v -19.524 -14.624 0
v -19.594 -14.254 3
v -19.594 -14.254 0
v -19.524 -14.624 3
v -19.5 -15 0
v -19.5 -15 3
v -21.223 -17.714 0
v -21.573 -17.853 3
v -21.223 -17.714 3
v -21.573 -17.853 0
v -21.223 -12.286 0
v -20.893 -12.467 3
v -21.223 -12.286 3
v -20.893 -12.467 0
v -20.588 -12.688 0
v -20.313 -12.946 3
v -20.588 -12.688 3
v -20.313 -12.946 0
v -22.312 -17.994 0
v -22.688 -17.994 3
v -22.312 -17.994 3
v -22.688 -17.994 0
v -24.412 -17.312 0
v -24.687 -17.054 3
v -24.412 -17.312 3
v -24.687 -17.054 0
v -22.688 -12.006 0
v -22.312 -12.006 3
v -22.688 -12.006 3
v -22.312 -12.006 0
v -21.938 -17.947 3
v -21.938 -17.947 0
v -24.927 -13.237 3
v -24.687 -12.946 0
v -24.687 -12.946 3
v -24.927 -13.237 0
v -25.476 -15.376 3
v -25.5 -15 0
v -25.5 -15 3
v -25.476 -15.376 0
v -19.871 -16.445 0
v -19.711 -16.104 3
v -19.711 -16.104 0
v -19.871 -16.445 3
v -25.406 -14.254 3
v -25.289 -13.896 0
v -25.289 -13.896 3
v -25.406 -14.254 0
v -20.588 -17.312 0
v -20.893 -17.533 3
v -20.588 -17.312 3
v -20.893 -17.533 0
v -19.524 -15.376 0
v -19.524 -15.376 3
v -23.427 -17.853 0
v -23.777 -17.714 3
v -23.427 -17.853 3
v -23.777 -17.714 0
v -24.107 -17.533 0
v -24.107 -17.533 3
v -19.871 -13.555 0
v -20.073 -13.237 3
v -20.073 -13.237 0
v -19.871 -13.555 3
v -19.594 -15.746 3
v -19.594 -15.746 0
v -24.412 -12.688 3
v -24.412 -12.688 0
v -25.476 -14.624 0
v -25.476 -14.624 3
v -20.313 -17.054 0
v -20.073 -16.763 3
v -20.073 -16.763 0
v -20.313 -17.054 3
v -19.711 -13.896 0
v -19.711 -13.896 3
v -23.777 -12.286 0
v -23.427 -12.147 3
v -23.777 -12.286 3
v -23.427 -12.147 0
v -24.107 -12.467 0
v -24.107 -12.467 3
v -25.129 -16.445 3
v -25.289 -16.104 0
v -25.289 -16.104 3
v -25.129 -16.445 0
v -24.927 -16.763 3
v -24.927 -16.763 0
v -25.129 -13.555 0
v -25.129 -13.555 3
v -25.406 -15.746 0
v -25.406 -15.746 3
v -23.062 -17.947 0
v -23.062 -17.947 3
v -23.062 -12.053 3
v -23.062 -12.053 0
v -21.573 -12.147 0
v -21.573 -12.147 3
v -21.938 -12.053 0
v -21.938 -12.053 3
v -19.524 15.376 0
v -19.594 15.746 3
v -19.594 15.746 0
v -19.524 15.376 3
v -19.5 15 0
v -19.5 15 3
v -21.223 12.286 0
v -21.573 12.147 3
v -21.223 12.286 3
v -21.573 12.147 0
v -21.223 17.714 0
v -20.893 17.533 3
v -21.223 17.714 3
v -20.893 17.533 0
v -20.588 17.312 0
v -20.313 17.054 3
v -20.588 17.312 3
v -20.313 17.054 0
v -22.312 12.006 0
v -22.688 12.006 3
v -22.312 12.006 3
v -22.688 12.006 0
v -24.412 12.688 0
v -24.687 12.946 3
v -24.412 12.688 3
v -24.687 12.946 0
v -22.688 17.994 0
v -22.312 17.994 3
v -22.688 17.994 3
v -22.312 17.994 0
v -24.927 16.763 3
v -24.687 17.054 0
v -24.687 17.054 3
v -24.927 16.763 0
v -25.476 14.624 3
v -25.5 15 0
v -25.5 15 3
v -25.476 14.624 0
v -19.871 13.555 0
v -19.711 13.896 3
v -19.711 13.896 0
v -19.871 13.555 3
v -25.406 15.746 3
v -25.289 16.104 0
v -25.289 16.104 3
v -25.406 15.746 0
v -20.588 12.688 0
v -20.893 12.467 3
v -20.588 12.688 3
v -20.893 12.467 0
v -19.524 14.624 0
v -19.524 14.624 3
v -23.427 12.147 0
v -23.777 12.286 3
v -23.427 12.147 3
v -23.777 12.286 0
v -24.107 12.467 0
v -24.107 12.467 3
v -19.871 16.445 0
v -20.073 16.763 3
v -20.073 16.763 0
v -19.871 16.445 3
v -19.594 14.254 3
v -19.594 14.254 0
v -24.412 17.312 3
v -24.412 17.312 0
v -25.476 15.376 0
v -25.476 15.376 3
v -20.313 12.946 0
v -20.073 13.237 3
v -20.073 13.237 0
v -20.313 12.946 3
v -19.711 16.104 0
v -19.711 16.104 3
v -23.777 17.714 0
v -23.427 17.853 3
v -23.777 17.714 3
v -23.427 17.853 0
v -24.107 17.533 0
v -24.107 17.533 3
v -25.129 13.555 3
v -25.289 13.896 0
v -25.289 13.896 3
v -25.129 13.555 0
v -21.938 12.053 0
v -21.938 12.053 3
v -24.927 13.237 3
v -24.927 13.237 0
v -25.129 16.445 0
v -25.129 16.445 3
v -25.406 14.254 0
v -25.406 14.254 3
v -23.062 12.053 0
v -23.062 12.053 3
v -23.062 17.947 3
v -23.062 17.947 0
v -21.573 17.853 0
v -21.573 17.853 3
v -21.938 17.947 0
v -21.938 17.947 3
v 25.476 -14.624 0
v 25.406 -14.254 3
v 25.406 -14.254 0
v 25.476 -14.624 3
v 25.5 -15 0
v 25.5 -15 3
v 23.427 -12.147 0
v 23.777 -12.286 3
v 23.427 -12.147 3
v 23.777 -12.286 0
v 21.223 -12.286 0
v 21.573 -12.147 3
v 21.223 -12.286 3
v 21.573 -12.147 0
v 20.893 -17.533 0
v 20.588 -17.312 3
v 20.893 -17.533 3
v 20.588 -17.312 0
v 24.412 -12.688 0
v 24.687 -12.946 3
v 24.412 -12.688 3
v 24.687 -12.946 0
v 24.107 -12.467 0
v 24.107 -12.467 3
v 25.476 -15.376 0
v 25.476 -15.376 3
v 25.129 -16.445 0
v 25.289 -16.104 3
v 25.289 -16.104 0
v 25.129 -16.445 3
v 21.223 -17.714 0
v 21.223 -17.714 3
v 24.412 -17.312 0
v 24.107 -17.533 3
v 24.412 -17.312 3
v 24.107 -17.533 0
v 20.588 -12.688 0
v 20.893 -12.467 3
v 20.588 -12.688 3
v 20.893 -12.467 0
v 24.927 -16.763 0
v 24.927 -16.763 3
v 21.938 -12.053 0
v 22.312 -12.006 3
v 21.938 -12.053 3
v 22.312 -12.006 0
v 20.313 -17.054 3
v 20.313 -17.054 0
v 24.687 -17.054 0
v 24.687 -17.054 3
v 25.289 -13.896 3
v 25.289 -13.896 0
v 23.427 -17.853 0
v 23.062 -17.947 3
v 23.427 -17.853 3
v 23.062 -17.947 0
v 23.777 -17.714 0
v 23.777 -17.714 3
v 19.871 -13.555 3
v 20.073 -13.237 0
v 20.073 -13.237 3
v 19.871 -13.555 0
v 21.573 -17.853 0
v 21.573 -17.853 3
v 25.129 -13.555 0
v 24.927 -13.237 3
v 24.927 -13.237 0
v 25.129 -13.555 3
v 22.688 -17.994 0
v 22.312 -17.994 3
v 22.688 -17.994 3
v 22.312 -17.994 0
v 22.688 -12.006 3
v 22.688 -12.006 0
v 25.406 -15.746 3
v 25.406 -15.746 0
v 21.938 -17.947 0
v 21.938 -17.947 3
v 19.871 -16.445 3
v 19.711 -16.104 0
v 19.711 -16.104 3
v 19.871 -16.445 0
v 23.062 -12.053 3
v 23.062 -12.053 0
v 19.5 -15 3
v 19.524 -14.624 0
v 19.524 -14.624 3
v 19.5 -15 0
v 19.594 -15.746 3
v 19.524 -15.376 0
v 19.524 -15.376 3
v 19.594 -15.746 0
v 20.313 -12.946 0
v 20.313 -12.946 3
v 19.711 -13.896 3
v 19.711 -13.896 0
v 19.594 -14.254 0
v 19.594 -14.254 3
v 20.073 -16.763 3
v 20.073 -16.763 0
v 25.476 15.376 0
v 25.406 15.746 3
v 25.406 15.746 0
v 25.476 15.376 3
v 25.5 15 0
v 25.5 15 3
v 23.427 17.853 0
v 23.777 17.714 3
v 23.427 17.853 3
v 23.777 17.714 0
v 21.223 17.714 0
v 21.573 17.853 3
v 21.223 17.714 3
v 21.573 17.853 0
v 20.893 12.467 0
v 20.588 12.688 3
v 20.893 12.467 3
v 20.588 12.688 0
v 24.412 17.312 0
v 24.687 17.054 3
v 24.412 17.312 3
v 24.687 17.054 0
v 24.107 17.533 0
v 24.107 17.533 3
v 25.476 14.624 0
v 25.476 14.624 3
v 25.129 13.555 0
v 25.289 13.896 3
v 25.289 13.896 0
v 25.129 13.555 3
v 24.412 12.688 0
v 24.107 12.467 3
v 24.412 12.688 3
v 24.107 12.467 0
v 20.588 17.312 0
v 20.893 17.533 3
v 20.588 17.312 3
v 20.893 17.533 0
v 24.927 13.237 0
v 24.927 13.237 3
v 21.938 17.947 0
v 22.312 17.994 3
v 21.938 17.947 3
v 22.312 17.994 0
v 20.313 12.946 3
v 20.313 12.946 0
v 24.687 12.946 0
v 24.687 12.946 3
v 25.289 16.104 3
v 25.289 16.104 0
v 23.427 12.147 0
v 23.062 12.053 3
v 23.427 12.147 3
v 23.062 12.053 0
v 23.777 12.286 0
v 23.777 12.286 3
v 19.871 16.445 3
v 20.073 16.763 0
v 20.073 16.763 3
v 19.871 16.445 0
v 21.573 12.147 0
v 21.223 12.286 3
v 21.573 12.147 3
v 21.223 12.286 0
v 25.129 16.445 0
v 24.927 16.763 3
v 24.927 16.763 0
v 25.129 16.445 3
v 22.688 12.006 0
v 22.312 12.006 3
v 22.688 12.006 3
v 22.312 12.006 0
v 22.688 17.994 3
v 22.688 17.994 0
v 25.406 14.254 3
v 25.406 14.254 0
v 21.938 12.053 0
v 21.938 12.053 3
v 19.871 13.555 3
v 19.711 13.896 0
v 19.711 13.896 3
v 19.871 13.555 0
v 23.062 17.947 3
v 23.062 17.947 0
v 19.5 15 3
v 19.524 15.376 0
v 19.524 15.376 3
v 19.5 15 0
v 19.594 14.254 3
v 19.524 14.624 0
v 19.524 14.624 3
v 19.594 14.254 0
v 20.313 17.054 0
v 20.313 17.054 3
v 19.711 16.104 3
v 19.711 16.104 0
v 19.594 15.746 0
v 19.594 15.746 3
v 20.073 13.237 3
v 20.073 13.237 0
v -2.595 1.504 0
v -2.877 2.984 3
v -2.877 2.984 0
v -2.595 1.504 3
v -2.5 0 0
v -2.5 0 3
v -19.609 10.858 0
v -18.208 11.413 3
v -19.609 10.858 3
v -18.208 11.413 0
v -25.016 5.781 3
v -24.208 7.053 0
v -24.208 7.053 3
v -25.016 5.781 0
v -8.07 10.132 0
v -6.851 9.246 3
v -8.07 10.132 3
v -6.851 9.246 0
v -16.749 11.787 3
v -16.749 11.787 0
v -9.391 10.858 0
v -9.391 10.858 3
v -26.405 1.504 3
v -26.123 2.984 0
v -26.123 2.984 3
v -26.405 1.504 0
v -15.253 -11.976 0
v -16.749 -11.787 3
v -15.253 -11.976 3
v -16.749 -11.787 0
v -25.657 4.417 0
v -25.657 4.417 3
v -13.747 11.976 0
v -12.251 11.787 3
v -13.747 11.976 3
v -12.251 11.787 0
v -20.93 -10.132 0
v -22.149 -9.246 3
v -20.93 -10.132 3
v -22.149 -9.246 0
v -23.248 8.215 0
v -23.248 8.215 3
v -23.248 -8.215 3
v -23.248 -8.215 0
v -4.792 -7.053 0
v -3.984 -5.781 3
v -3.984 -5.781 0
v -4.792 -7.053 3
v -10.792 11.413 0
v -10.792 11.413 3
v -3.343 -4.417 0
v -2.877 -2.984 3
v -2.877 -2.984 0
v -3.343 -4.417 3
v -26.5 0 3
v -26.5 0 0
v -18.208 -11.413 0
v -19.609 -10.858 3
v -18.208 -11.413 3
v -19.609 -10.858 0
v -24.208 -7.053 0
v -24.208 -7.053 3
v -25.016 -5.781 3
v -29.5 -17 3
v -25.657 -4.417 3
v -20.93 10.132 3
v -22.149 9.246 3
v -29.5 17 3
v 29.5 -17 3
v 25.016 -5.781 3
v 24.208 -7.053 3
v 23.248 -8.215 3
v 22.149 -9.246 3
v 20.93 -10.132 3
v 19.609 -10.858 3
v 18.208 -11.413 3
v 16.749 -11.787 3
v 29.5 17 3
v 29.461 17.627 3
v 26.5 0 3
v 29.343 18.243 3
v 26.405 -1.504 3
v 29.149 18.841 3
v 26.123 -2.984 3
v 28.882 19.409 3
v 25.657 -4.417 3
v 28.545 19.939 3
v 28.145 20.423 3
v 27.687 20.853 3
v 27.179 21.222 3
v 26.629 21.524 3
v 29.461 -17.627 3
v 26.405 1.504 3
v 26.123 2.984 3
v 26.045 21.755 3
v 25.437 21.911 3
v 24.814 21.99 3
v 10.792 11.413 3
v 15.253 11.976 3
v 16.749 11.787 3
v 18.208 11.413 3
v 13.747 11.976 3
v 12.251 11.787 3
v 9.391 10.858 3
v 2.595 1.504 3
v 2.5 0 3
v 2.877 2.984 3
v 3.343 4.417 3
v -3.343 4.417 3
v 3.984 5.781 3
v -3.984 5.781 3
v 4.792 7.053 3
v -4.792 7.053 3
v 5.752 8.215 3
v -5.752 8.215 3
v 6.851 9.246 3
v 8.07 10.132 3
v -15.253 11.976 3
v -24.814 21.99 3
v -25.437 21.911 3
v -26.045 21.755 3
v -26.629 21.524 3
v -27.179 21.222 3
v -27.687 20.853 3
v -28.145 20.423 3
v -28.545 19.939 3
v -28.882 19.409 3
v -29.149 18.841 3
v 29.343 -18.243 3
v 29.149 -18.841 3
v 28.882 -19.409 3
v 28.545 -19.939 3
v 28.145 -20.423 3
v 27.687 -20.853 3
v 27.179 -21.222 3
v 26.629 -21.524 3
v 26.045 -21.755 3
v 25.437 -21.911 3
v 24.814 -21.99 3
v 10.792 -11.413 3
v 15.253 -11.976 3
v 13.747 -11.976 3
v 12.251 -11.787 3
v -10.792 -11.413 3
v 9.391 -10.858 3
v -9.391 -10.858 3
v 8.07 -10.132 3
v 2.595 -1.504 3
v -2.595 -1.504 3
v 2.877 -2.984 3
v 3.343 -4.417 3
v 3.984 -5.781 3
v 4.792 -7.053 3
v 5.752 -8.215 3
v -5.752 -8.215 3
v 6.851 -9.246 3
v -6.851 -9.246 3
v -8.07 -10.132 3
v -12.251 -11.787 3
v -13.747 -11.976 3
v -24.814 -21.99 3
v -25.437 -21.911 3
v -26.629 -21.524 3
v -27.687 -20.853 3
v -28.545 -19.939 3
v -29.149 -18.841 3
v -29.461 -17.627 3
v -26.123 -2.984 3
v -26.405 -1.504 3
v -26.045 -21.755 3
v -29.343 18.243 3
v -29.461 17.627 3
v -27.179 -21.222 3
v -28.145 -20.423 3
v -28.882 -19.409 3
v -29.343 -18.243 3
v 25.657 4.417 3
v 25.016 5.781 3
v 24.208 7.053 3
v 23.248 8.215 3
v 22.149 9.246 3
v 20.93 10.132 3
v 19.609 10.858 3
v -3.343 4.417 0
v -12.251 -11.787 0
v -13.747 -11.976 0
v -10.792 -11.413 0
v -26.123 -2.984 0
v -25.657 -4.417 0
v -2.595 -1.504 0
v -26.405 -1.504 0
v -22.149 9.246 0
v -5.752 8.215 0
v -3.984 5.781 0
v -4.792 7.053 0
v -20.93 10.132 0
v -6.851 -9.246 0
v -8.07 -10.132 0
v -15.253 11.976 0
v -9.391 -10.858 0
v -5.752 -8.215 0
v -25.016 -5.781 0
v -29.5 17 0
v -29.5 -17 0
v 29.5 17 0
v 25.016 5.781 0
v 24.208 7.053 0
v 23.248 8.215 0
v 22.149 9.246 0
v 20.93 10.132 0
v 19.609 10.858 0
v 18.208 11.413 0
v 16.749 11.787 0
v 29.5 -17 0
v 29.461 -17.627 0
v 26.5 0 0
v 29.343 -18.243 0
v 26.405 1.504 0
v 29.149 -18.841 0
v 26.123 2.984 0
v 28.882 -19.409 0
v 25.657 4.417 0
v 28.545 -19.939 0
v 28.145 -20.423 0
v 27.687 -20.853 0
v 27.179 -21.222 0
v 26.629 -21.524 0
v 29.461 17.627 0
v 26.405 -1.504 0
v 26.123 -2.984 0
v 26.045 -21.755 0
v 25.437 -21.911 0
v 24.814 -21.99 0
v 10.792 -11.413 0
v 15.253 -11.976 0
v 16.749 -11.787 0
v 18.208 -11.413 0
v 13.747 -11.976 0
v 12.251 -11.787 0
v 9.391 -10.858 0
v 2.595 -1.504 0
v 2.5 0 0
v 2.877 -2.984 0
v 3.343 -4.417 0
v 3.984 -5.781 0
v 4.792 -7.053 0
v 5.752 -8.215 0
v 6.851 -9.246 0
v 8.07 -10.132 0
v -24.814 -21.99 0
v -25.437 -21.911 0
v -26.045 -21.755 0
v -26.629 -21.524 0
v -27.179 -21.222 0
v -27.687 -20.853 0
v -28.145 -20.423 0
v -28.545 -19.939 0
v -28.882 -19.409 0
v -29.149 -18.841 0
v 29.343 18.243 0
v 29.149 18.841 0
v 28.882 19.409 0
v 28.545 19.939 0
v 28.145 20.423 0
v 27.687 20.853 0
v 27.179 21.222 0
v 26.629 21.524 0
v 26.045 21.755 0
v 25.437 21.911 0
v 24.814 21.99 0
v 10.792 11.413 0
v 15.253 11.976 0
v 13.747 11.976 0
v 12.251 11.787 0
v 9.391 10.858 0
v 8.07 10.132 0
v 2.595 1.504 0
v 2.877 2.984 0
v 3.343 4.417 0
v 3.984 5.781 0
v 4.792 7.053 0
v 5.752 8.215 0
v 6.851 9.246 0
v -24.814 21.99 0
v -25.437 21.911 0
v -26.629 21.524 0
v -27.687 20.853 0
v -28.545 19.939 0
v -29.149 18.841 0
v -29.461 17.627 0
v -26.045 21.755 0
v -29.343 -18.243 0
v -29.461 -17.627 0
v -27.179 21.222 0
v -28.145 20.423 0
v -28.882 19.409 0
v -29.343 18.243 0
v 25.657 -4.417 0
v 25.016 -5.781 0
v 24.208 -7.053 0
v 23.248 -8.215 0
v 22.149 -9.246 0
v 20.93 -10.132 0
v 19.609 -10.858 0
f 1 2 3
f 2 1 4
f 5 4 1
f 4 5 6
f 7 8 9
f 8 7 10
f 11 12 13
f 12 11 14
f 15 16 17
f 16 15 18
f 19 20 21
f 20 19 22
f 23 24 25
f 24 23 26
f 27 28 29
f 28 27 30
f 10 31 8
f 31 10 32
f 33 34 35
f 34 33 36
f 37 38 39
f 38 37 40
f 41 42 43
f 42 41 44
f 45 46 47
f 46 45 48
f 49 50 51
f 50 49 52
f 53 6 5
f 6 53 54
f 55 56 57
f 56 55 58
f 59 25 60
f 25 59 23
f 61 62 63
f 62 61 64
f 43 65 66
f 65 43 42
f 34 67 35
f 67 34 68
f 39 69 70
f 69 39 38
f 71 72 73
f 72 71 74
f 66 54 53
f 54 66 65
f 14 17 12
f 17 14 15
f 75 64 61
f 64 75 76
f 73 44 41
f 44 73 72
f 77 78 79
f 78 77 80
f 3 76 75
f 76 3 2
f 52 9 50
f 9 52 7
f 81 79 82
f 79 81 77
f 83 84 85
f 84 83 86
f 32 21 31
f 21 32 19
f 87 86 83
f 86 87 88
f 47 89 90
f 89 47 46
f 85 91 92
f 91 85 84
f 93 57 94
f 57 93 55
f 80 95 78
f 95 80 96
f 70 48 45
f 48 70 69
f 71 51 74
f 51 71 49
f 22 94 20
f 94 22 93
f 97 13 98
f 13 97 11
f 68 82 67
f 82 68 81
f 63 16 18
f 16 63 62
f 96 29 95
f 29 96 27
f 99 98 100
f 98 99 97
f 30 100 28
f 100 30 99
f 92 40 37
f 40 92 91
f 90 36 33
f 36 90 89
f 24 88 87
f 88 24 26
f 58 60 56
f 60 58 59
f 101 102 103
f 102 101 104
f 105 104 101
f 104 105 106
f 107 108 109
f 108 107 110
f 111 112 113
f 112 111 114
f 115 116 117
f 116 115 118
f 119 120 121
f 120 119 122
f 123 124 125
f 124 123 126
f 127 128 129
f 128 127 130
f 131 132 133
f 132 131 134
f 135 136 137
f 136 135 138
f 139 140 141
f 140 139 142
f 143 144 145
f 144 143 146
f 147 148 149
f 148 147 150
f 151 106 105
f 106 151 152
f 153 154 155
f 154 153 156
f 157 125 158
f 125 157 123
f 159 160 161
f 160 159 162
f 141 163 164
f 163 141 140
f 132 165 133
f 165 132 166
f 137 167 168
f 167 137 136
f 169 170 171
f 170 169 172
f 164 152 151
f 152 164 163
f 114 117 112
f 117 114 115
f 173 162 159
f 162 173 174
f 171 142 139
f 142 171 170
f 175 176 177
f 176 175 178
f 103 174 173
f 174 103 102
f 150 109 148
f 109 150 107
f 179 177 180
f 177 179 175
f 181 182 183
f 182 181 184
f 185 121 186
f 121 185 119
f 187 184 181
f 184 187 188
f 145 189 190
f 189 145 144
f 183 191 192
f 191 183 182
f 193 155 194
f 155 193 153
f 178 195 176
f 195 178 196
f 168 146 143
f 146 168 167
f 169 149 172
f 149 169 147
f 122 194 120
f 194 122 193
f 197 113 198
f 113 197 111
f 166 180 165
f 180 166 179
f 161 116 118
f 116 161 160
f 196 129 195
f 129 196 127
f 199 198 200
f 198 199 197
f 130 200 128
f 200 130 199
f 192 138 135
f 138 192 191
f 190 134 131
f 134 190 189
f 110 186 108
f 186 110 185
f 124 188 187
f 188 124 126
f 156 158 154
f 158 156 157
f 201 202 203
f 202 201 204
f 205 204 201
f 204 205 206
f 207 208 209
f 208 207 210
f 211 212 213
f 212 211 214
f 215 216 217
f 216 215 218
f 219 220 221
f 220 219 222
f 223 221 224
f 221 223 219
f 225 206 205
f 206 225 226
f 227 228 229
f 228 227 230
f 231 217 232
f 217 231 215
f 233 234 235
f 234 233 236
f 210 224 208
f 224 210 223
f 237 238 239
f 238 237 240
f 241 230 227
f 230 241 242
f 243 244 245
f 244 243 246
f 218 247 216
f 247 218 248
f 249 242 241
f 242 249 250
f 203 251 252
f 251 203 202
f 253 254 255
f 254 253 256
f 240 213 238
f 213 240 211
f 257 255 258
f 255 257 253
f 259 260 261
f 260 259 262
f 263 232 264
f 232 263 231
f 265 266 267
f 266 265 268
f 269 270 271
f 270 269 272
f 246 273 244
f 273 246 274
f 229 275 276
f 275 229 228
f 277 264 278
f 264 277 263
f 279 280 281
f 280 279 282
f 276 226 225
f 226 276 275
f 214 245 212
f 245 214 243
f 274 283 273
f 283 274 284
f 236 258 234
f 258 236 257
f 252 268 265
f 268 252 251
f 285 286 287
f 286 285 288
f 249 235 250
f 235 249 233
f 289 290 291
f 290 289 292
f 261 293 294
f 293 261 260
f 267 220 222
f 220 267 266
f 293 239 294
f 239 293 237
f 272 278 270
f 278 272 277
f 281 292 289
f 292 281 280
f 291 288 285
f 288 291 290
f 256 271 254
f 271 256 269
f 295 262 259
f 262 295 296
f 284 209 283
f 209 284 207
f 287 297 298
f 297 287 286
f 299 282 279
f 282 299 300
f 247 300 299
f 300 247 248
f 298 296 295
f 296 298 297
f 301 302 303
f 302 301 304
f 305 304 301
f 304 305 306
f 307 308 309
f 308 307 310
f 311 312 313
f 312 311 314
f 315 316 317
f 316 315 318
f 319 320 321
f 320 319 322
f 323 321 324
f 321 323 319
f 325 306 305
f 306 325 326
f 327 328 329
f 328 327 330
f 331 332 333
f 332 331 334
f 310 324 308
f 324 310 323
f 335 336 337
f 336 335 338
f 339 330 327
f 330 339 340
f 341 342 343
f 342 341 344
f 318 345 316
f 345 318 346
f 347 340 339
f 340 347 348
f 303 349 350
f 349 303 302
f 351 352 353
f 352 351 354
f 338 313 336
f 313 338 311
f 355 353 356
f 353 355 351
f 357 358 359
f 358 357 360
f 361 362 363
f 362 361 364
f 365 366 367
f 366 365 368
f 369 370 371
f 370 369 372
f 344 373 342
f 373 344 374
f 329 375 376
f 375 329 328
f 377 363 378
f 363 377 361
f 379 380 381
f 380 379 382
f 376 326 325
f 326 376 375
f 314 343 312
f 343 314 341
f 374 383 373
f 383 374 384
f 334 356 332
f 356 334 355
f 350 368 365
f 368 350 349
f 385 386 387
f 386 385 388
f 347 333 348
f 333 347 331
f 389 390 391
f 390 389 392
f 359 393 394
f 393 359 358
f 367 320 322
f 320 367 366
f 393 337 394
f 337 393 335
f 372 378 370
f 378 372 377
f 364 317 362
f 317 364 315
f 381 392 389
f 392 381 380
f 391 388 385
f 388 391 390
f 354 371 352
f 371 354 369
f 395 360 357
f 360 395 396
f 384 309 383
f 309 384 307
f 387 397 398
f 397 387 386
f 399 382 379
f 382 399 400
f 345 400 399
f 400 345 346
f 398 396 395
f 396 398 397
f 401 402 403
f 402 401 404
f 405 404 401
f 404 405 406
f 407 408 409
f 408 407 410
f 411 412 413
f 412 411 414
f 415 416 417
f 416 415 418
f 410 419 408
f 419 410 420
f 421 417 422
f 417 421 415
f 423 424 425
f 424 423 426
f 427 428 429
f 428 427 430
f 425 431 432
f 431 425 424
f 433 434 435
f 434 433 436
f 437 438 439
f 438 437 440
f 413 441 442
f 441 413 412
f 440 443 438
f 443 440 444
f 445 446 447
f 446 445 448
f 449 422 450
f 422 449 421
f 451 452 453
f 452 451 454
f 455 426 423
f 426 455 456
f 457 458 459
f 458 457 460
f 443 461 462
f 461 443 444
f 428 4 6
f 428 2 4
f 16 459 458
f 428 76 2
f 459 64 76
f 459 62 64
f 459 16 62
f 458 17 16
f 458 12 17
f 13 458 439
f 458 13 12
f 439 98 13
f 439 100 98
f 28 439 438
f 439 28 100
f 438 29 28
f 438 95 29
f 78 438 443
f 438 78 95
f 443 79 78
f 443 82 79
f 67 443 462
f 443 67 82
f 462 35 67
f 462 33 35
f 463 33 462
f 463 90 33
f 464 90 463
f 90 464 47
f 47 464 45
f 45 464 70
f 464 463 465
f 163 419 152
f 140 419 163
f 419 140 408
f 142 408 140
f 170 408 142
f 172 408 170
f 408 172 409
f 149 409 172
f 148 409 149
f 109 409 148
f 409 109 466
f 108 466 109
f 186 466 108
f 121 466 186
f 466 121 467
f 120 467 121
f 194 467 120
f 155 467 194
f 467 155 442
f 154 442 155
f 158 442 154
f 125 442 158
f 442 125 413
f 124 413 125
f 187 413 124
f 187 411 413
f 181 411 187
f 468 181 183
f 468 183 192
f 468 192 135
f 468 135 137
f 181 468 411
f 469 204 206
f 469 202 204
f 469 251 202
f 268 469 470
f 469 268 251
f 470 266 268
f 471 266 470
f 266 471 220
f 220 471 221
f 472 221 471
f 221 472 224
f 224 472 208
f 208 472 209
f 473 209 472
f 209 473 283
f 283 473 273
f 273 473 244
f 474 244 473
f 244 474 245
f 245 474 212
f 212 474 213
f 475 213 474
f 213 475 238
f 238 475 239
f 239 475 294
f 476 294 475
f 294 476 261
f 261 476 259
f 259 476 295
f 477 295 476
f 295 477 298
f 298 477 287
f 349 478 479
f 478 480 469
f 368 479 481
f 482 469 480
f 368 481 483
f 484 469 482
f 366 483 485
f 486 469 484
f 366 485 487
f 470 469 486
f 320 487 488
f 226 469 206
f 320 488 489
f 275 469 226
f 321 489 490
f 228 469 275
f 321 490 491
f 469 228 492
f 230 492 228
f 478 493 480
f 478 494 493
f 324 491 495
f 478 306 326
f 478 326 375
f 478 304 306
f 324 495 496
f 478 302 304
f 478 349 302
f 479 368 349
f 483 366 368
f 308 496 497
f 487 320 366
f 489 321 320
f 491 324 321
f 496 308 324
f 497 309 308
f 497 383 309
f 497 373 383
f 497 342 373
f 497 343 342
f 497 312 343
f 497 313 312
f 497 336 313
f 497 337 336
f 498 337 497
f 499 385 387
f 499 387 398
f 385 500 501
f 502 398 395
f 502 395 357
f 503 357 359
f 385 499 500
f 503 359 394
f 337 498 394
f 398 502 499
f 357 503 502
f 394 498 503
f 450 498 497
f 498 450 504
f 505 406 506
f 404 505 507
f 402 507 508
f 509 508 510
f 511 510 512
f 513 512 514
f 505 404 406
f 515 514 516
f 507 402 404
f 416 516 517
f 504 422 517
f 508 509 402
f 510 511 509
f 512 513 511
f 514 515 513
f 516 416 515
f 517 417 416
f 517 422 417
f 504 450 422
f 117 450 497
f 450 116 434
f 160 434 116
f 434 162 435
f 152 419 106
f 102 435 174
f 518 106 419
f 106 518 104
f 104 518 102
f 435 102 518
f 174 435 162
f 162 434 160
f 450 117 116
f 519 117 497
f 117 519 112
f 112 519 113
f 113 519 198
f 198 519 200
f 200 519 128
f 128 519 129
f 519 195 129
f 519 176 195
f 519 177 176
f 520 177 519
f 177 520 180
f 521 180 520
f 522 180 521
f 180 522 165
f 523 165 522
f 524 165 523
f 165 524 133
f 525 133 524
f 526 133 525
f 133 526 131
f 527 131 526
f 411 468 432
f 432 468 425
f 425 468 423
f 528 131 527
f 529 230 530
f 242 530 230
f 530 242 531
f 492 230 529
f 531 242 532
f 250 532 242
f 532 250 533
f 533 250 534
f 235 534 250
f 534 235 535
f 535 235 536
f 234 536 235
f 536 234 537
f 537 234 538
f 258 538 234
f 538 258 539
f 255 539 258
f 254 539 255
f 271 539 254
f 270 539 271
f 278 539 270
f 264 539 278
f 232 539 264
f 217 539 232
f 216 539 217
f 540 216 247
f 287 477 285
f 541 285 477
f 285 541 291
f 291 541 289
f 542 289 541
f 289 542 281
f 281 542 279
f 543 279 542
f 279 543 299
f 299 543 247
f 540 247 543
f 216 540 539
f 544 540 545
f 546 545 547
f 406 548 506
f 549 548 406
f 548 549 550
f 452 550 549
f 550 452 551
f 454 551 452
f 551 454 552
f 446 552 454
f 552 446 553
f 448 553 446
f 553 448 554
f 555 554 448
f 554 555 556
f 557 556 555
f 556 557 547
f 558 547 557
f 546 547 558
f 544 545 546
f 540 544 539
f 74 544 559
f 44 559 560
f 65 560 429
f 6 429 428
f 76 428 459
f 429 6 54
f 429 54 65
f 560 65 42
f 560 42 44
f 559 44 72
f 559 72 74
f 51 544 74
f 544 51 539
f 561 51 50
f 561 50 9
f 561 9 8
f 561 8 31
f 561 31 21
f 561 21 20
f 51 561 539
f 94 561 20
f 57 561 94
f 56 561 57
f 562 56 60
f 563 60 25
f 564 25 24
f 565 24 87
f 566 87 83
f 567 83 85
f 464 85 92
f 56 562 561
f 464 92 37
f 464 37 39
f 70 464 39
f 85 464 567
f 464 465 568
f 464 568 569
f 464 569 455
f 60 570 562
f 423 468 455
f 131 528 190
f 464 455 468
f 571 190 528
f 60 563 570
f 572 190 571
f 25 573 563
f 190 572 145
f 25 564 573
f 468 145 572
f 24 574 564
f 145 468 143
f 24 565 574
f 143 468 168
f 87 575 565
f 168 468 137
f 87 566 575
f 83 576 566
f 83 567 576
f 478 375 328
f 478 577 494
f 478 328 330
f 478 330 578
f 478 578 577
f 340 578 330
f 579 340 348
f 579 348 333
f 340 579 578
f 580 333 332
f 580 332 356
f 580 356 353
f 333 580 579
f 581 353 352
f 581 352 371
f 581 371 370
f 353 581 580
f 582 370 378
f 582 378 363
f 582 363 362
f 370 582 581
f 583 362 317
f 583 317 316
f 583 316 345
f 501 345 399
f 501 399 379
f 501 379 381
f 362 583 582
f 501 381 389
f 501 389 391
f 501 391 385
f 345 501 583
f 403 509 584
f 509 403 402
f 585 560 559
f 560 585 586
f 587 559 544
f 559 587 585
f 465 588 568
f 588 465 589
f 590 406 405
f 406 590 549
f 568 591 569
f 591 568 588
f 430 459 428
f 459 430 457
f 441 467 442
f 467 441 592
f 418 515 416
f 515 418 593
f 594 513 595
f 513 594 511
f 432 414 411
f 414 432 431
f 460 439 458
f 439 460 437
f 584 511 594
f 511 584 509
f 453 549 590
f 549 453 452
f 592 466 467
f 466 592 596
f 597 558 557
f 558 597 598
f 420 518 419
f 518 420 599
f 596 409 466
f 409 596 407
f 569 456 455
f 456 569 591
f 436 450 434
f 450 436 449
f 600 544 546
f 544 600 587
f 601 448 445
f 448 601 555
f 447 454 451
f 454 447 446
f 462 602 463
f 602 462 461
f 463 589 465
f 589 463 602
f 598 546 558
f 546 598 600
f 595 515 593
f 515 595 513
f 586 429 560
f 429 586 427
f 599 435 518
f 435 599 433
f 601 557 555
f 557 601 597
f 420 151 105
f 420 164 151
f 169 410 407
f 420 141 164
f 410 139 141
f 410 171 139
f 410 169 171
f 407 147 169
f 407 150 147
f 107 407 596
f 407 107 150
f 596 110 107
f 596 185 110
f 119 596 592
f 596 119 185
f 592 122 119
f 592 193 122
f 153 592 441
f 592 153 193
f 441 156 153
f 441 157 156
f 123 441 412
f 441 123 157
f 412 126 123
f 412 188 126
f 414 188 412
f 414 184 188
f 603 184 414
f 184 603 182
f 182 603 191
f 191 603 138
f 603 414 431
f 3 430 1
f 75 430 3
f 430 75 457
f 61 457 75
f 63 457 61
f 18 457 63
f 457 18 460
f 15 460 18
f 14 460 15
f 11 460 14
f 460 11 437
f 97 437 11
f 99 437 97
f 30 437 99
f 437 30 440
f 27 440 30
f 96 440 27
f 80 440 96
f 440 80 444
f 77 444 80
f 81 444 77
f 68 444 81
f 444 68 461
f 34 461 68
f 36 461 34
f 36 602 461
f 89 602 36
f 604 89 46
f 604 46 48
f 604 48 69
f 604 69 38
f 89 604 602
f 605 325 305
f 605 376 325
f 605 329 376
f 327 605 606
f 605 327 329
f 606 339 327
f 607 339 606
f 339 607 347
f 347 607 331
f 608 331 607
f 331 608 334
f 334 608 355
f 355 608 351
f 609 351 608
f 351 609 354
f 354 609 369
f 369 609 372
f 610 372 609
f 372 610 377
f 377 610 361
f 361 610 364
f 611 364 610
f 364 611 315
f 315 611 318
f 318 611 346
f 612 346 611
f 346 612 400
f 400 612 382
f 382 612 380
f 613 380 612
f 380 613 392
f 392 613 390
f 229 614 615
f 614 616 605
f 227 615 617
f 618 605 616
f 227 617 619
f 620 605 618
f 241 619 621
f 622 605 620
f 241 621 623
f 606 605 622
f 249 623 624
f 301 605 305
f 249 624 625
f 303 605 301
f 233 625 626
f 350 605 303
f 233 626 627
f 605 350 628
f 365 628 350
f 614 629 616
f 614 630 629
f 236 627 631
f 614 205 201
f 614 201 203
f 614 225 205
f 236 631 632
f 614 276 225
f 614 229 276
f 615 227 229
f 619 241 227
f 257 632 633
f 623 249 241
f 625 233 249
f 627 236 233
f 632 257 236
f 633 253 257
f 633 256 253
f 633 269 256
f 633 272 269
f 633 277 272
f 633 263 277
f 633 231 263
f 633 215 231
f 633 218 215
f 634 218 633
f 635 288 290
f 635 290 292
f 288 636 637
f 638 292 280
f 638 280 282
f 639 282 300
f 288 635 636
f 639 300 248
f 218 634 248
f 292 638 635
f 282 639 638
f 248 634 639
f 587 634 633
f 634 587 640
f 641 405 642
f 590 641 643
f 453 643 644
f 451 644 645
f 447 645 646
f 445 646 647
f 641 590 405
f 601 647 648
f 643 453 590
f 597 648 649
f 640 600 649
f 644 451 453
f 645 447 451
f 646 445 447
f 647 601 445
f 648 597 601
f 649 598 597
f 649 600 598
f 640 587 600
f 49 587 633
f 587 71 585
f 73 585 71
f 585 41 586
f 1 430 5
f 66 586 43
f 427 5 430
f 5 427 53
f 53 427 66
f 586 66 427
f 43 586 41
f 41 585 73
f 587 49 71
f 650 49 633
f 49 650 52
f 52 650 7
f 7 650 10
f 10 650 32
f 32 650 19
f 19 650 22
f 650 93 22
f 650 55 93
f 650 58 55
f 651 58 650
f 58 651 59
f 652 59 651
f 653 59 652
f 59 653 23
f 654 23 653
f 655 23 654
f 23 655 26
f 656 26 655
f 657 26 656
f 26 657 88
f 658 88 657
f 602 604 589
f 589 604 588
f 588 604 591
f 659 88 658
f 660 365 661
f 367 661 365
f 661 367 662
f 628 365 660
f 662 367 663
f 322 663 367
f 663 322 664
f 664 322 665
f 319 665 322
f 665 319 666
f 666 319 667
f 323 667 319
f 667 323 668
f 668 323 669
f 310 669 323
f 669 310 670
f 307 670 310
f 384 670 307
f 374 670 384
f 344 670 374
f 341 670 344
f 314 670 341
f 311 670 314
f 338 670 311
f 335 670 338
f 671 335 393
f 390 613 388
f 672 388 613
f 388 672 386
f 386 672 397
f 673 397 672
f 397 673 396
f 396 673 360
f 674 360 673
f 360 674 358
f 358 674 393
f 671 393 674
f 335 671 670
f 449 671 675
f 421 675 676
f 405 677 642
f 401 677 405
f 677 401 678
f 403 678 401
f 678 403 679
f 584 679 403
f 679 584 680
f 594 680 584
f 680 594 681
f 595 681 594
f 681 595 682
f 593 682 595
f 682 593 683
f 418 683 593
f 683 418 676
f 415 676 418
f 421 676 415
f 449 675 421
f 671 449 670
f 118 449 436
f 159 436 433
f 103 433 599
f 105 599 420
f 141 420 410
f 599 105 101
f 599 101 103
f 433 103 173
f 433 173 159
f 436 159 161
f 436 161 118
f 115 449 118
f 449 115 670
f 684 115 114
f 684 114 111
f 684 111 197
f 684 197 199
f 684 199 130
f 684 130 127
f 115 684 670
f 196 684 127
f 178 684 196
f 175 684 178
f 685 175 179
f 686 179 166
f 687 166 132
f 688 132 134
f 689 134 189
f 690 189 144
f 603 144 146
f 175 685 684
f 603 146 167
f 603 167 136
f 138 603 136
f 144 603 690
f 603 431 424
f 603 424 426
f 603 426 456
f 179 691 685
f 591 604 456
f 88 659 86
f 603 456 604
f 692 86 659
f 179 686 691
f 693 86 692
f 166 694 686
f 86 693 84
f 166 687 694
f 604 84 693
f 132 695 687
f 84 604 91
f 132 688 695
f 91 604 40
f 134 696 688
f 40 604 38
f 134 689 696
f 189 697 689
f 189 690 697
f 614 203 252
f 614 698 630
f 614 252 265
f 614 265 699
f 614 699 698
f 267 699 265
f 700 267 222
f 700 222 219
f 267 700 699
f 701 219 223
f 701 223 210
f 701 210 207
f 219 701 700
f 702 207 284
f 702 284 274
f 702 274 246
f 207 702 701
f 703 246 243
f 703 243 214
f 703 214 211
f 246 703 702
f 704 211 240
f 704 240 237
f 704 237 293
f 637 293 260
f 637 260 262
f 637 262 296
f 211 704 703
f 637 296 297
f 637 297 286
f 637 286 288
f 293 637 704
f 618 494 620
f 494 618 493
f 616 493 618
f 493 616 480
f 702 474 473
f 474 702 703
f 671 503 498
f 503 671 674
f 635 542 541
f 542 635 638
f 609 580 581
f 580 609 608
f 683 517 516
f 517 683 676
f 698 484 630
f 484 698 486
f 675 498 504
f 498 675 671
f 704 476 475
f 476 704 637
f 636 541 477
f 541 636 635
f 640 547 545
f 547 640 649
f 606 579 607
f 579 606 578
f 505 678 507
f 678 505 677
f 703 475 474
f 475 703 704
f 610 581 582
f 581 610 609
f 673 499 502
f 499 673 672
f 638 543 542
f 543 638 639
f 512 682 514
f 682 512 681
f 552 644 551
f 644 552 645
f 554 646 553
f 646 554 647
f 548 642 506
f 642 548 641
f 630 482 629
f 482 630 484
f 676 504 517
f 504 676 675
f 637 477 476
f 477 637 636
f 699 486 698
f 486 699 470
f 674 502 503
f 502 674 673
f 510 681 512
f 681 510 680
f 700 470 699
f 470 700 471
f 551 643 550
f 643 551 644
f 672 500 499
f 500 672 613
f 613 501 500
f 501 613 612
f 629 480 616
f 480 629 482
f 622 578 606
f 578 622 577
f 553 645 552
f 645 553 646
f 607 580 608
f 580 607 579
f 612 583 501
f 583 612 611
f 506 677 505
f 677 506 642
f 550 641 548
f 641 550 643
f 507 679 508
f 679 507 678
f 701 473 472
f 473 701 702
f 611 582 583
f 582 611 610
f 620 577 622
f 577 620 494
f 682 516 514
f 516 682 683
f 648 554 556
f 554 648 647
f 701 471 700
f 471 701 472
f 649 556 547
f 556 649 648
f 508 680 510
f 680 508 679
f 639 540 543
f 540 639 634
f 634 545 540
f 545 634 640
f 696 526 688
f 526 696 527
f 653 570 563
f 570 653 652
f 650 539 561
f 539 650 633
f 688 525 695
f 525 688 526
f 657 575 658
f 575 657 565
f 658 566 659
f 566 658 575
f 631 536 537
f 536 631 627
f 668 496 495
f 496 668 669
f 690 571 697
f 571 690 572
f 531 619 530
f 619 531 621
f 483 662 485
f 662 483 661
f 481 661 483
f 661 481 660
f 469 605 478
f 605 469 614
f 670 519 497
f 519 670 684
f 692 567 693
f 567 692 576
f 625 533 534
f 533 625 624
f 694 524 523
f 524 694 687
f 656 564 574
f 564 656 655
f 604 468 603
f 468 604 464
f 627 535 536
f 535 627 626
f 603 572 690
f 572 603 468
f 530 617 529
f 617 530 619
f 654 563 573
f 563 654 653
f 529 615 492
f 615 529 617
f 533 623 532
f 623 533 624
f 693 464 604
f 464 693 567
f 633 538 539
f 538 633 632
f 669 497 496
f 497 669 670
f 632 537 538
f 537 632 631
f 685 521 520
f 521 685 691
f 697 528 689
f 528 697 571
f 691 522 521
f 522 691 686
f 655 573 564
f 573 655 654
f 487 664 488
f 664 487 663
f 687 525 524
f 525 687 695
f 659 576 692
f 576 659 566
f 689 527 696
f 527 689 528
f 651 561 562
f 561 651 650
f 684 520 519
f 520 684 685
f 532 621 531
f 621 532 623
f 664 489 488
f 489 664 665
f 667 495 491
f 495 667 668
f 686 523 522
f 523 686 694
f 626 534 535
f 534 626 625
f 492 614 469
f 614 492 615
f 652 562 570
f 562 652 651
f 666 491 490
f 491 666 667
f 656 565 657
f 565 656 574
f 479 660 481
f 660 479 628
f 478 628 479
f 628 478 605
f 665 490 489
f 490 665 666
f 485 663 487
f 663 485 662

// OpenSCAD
$fn = 50;


difference() {
	union() {
		hull() {
			translate(v = [-24.5000000000, 17.0000000000, 0]) {
				cylinder(h = 3, r = 5);
			}
			translate(v = [24.5000000000, 17.0000000000, 0]) {
				cylinder(h = 3, r = 5);
			}
			translate(v = [-24.5000000000, -17.0000000000, 0]) {
				cylinder(h = 3, r = 5);
			}
			translate(v = [24.5000000000, -17.0000000000, 0]) {
				cylinder(h = 3, r = 5);
			}
		}
	}
	union() {
		#translate(v = [-22.5000000000, -15.0000000000, -100.0000000000]) {
			cylinder(h = 200, r = 3.0000000000);
		}
		#translate(v = [-22.5000000000, 15.0000000000, -100.0000000000]) {
			cylinder(h = 200, r = 3.0000000000);
		}
		#translate(v = [22.5000000000, -15.0000000000, -100.0000000000]) {
			cylinder(h = 200, r = 3.0000000000);
		}
		#translate(v = [22.5000000000, 15.0000000000, -100.0000000000]) {
			cylinder(h = 200, r = 3.0000000000);
		}
		#translate(v = [-14.5000000000, 0, 0]) {
			cylinder(h = 3, r = 12.0000000000);
		}
		#translate(v = [14.5000000000, 0, 0]) {
			cylinder(h = 3, r = 12.0000000000);
		}
	}
}
